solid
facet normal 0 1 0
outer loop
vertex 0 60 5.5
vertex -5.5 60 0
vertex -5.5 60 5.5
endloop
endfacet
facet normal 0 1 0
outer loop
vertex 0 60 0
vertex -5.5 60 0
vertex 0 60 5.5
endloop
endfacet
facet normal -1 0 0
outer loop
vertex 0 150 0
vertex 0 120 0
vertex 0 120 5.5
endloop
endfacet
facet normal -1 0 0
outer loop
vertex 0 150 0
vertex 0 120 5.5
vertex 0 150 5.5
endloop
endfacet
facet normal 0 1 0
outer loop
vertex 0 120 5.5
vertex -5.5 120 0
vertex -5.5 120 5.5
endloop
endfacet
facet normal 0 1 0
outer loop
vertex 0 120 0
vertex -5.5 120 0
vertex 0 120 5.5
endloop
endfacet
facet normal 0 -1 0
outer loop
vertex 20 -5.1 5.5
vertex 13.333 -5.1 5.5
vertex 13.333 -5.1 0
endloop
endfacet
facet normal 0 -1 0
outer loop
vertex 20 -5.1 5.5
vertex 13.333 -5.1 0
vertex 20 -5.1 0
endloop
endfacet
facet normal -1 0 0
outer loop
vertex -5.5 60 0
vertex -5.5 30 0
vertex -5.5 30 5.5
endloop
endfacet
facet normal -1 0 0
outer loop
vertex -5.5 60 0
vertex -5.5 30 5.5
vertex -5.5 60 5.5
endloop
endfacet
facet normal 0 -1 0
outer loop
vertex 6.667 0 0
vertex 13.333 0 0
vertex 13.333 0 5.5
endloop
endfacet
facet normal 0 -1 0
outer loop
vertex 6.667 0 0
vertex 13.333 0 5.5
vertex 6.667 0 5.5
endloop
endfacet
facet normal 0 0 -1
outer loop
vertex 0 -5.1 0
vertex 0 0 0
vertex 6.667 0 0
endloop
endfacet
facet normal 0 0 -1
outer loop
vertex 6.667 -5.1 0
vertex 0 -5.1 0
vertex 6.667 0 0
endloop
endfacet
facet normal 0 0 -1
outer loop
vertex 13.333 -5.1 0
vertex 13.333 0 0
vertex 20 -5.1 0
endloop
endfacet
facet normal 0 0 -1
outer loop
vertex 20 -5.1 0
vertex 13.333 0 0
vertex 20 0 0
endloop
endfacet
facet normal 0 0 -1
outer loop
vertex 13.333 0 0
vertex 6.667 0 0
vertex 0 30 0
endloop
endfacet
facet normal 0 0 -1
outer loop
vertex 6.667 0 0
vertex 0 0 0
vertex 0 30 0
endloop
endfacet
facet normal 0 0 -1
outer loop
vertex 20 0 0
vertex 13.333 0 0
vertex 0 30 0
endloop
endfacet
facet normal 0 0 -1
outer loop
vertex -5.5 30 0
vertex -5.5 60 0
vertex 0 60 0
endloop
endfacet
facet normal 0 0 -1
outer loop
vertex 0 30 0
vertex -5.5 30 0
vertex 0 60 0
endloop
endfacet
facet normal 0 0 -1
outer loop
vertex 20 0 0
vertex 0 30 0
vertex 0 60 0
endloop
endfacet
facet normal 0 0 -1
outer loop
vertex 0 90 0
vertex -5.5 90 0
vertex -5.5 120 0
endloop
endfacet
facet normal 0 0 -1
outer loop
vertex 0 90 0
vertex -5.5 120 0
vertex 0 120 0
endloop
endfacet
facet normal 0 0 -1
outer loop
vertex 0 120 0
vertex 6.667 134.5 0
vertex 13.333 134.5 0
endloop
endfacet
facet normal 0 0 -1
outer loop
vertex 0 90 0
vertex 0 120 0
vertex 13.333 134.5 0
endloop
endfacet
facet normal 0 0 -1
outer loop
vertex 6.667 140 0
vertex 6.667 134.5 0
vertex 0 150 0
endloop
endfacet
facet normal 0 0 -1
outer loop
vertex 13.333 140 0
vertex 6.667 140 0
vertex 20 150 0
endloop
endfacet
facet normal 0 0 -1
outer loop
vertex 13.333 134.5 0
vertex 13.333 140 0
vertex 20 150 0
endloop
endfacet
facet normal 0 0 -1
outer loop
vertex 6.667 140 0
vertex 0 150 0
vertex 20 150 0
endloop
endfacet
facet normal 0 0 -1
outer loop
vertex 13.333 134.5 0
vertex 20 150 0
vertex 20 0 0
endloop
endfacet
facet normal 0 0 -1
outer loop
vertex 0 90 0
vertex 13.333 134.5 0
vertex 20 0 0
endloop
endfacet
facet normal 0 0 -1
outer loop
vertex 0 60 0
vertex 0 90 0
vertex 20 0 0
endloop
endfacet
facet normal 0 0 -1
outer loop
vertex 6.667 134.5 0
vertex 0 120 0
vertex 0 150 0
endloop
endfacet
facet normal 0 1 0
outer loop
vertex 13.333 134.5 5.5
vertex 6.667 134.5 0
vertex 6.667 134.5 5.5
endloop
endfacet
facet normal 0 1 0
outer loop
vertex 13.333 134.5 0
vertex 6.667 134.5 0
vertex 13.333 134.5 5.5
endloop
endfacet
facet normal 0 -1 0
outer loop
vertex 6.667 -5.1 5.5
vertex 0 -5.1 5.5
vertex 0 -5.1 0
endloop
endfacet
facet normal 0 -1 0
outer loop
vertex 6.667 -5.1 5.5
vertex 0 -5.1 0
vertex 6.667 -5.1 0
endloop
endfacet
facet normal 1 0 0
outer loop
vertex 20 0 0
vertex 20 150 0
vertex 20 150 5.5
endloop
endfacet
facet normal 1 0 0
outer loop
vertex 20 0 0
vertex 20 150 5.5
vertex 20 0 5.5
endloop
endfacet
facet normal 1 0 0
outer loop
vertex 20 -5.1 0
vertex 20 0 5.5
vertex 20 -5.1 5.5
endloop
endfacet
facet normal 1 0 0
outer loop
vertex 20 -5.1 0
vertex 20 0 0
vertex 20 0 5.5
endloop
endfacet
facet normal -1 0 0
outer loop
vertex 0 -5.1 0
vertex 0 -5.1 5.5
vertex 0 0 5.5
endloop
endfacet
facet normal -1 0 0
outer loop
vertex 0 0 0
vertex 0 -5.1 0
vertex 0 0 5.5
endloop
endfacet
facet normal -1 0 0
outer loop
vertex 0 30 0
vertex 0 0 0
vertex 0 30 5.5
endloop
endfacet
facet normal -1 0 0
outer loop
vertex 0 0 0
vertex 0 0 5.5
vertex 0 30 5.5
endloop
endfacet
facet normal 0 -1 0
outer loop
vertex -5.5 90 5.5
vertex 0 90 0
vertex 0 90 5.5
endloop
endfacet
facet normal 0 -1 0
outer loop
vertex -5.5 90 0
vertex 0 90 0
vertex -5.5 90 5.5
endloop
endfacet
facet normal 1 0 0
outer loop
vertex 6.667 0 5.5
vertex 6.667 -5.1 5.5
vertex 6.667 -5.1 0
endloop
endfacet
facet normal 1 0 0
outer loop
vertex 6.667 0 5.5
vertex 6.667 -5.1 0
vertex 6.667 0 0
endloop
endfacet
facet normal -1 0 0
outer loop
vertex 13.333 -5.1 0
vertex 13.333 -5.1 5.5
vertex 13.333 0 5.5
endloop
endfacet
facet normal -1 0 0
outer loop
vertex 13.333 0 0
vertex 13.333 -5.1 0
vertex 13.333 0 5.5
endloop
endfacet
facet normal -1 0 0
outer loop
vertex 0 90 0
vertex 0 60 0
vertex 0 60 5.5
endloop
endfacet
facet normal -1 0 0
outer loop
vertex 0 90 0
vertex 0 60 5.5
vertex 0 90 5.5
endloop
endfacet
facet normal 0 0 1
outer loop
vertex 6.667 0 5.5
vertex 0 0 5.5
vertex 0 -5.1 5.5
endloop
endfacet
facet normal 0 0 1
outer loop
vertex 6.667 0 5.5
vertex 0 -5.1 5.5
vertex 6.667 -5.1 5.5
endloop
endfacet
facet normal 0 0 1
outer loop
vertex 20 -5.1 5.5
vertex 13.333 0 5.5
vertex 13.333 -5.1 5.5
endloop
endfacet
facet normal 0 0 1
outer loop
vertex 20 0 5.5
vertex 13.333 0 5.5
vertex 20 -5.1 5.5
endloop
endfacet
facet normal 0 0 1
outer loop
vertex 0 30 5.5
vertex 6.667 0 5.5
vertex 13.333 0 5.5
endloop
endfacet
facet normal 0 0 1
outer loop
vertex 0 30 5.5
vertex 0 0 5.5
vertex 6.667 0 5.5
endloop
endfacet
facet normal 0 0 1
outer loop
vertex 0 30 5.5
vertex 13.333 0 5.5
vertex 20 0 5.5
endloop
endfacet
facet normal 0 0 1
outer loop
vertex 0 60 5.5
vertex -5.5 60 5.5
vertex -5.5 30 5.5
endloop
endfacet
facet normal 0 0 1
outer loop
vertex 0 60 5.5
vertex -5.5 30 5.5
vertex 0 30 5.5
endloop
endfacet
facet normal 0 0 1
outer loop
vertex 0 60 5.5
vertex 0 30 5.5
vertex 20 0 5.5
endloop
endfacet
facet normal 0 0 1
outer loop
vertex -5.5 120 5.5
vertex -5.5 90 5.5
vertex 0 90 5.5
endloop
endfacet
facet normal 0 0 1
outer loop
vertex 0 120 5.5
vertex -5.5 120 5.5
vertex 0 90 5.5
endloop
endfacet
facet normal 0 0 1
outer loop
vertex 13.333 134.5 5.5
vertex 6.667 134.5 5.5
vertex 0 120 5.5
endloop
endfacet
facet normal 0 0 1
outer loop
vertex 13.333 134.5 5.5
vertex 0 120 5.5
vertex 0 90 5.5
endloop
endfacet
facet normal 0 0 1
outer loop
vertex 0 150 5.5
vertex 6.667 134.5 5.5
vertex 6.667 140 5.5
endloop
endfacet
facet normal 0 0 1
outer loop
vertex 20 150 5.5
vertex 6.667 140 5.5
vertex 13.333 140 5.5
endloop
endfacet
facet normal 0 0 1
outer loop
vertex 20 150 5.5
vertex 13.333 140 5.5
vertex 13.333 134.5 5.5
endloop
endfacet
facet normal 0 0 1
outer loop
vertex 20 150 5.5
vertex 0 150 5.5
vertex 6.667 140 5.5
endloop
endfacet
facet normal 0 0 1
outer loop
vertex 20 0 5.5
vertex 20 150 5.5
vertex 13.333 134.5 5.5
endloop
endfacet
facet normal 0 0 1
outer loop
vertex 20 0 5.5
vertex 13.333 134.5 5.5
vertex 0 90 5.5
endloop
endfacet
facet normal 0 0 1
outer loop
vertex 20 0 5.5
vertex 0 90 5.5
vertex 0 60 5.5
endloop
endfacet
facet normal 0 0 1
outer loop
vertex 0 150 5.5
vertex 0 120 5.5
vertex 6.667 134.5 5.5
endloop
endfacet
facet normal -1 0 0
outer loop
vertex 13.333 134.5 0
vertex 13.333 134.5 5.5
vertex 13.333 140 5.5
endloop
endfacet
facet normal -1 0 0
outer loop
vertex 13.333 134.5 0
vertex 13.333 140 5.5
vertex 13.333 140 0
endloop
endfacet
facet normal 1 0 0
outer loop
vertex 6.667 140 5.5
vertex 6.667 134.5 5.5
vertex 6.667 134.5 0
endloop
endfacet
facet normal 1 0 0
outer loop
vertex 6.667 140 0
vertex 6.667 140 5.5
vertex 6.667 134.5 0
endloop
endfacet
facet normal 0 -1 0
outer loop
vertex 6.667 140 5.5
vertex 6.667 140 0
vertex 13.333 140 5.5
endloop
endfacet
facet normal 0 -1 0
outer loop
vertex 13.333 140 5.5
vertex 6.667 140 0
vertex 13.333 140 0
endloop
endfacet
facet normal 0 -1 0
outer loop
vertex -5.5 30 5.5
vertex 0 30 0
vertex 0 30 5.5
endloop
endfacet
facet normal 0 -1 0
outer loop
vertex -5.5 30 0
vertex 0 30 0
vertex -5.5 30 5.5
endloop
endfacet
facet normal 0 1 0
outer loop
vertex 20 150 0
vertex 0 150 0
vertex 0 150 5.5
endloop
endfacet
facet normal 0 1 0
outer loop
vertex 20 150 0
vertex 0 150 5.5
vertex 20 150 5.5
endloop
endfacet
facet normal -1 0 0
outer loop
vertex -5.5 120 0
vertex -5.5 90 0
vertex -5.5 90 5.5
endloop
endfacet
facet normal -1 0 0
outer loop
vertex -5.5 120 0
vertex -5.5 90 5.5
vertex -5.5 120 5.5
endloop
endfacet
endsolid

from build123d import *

# Parameters (mm, degrees)
BOSS_EXTRUDE1_DEPTH = 5.5
CAVITY1_START       = 134.5
CAVITY1_OUTLINE_W   = 6.666666666
CAVITY1_OUTLINE_H   = 5.5
CAVITY1_DEPTH       = 5.5
SKETCH2_W           = 6.666666667
SKETCH2_H           = 5.1
BOSS_EXTRUDE2_DEPTH = 5.5


# Read off the part's stored shape, not the designer's step: Cavity1
with BuildPart() as part:
    # Sketch1 → Boss-Extrude1 (new body)
    with BuildSketch(Plane.XY):
        Polygon((0, 120), (0, 150), (20, 150), (20, 0), (0, 0), (0, 30), (-5.5, 30), (-5.5, 60), (0, 60), (0, 90), (-5.5, 90), (-5.5, 120), align=None)
    extrude(amount=BOSS_EXTRUDE1_DEPTH)

    # Cavity1 outline → Cavity1 (cut)
    with BuildSketch(Plane(origin=(0, 0, 0), x_dir=(1, 0, 0), z_dir=(0, 1, 0)).offset(CAVITY1_START)):
        with Locations((10, -2.75)):
            Rectangle(CAVITY1_OUTLINE_W, CAVITY1_OUTLINE_H)
    extrude(amount=CAVITY1_DEPTH, mode=Mode.SUBTRACT)

    # Sketch2 → Boss-Extrude2 (add)
    with BuildSketch(Plane.XY.offset(5.5)):
        with Locations((3.333333334, -2.55)):
            Rectangle(SKETCH2_W, SKETCH2_H)
        with Locations((16.666666666, -2.55)):
            Rectangle(SKETCH2_W, SKETCH2_H)
    extrude(amount=-BOSS_EXTRUDE2_DEPTH)


solid = part.part
